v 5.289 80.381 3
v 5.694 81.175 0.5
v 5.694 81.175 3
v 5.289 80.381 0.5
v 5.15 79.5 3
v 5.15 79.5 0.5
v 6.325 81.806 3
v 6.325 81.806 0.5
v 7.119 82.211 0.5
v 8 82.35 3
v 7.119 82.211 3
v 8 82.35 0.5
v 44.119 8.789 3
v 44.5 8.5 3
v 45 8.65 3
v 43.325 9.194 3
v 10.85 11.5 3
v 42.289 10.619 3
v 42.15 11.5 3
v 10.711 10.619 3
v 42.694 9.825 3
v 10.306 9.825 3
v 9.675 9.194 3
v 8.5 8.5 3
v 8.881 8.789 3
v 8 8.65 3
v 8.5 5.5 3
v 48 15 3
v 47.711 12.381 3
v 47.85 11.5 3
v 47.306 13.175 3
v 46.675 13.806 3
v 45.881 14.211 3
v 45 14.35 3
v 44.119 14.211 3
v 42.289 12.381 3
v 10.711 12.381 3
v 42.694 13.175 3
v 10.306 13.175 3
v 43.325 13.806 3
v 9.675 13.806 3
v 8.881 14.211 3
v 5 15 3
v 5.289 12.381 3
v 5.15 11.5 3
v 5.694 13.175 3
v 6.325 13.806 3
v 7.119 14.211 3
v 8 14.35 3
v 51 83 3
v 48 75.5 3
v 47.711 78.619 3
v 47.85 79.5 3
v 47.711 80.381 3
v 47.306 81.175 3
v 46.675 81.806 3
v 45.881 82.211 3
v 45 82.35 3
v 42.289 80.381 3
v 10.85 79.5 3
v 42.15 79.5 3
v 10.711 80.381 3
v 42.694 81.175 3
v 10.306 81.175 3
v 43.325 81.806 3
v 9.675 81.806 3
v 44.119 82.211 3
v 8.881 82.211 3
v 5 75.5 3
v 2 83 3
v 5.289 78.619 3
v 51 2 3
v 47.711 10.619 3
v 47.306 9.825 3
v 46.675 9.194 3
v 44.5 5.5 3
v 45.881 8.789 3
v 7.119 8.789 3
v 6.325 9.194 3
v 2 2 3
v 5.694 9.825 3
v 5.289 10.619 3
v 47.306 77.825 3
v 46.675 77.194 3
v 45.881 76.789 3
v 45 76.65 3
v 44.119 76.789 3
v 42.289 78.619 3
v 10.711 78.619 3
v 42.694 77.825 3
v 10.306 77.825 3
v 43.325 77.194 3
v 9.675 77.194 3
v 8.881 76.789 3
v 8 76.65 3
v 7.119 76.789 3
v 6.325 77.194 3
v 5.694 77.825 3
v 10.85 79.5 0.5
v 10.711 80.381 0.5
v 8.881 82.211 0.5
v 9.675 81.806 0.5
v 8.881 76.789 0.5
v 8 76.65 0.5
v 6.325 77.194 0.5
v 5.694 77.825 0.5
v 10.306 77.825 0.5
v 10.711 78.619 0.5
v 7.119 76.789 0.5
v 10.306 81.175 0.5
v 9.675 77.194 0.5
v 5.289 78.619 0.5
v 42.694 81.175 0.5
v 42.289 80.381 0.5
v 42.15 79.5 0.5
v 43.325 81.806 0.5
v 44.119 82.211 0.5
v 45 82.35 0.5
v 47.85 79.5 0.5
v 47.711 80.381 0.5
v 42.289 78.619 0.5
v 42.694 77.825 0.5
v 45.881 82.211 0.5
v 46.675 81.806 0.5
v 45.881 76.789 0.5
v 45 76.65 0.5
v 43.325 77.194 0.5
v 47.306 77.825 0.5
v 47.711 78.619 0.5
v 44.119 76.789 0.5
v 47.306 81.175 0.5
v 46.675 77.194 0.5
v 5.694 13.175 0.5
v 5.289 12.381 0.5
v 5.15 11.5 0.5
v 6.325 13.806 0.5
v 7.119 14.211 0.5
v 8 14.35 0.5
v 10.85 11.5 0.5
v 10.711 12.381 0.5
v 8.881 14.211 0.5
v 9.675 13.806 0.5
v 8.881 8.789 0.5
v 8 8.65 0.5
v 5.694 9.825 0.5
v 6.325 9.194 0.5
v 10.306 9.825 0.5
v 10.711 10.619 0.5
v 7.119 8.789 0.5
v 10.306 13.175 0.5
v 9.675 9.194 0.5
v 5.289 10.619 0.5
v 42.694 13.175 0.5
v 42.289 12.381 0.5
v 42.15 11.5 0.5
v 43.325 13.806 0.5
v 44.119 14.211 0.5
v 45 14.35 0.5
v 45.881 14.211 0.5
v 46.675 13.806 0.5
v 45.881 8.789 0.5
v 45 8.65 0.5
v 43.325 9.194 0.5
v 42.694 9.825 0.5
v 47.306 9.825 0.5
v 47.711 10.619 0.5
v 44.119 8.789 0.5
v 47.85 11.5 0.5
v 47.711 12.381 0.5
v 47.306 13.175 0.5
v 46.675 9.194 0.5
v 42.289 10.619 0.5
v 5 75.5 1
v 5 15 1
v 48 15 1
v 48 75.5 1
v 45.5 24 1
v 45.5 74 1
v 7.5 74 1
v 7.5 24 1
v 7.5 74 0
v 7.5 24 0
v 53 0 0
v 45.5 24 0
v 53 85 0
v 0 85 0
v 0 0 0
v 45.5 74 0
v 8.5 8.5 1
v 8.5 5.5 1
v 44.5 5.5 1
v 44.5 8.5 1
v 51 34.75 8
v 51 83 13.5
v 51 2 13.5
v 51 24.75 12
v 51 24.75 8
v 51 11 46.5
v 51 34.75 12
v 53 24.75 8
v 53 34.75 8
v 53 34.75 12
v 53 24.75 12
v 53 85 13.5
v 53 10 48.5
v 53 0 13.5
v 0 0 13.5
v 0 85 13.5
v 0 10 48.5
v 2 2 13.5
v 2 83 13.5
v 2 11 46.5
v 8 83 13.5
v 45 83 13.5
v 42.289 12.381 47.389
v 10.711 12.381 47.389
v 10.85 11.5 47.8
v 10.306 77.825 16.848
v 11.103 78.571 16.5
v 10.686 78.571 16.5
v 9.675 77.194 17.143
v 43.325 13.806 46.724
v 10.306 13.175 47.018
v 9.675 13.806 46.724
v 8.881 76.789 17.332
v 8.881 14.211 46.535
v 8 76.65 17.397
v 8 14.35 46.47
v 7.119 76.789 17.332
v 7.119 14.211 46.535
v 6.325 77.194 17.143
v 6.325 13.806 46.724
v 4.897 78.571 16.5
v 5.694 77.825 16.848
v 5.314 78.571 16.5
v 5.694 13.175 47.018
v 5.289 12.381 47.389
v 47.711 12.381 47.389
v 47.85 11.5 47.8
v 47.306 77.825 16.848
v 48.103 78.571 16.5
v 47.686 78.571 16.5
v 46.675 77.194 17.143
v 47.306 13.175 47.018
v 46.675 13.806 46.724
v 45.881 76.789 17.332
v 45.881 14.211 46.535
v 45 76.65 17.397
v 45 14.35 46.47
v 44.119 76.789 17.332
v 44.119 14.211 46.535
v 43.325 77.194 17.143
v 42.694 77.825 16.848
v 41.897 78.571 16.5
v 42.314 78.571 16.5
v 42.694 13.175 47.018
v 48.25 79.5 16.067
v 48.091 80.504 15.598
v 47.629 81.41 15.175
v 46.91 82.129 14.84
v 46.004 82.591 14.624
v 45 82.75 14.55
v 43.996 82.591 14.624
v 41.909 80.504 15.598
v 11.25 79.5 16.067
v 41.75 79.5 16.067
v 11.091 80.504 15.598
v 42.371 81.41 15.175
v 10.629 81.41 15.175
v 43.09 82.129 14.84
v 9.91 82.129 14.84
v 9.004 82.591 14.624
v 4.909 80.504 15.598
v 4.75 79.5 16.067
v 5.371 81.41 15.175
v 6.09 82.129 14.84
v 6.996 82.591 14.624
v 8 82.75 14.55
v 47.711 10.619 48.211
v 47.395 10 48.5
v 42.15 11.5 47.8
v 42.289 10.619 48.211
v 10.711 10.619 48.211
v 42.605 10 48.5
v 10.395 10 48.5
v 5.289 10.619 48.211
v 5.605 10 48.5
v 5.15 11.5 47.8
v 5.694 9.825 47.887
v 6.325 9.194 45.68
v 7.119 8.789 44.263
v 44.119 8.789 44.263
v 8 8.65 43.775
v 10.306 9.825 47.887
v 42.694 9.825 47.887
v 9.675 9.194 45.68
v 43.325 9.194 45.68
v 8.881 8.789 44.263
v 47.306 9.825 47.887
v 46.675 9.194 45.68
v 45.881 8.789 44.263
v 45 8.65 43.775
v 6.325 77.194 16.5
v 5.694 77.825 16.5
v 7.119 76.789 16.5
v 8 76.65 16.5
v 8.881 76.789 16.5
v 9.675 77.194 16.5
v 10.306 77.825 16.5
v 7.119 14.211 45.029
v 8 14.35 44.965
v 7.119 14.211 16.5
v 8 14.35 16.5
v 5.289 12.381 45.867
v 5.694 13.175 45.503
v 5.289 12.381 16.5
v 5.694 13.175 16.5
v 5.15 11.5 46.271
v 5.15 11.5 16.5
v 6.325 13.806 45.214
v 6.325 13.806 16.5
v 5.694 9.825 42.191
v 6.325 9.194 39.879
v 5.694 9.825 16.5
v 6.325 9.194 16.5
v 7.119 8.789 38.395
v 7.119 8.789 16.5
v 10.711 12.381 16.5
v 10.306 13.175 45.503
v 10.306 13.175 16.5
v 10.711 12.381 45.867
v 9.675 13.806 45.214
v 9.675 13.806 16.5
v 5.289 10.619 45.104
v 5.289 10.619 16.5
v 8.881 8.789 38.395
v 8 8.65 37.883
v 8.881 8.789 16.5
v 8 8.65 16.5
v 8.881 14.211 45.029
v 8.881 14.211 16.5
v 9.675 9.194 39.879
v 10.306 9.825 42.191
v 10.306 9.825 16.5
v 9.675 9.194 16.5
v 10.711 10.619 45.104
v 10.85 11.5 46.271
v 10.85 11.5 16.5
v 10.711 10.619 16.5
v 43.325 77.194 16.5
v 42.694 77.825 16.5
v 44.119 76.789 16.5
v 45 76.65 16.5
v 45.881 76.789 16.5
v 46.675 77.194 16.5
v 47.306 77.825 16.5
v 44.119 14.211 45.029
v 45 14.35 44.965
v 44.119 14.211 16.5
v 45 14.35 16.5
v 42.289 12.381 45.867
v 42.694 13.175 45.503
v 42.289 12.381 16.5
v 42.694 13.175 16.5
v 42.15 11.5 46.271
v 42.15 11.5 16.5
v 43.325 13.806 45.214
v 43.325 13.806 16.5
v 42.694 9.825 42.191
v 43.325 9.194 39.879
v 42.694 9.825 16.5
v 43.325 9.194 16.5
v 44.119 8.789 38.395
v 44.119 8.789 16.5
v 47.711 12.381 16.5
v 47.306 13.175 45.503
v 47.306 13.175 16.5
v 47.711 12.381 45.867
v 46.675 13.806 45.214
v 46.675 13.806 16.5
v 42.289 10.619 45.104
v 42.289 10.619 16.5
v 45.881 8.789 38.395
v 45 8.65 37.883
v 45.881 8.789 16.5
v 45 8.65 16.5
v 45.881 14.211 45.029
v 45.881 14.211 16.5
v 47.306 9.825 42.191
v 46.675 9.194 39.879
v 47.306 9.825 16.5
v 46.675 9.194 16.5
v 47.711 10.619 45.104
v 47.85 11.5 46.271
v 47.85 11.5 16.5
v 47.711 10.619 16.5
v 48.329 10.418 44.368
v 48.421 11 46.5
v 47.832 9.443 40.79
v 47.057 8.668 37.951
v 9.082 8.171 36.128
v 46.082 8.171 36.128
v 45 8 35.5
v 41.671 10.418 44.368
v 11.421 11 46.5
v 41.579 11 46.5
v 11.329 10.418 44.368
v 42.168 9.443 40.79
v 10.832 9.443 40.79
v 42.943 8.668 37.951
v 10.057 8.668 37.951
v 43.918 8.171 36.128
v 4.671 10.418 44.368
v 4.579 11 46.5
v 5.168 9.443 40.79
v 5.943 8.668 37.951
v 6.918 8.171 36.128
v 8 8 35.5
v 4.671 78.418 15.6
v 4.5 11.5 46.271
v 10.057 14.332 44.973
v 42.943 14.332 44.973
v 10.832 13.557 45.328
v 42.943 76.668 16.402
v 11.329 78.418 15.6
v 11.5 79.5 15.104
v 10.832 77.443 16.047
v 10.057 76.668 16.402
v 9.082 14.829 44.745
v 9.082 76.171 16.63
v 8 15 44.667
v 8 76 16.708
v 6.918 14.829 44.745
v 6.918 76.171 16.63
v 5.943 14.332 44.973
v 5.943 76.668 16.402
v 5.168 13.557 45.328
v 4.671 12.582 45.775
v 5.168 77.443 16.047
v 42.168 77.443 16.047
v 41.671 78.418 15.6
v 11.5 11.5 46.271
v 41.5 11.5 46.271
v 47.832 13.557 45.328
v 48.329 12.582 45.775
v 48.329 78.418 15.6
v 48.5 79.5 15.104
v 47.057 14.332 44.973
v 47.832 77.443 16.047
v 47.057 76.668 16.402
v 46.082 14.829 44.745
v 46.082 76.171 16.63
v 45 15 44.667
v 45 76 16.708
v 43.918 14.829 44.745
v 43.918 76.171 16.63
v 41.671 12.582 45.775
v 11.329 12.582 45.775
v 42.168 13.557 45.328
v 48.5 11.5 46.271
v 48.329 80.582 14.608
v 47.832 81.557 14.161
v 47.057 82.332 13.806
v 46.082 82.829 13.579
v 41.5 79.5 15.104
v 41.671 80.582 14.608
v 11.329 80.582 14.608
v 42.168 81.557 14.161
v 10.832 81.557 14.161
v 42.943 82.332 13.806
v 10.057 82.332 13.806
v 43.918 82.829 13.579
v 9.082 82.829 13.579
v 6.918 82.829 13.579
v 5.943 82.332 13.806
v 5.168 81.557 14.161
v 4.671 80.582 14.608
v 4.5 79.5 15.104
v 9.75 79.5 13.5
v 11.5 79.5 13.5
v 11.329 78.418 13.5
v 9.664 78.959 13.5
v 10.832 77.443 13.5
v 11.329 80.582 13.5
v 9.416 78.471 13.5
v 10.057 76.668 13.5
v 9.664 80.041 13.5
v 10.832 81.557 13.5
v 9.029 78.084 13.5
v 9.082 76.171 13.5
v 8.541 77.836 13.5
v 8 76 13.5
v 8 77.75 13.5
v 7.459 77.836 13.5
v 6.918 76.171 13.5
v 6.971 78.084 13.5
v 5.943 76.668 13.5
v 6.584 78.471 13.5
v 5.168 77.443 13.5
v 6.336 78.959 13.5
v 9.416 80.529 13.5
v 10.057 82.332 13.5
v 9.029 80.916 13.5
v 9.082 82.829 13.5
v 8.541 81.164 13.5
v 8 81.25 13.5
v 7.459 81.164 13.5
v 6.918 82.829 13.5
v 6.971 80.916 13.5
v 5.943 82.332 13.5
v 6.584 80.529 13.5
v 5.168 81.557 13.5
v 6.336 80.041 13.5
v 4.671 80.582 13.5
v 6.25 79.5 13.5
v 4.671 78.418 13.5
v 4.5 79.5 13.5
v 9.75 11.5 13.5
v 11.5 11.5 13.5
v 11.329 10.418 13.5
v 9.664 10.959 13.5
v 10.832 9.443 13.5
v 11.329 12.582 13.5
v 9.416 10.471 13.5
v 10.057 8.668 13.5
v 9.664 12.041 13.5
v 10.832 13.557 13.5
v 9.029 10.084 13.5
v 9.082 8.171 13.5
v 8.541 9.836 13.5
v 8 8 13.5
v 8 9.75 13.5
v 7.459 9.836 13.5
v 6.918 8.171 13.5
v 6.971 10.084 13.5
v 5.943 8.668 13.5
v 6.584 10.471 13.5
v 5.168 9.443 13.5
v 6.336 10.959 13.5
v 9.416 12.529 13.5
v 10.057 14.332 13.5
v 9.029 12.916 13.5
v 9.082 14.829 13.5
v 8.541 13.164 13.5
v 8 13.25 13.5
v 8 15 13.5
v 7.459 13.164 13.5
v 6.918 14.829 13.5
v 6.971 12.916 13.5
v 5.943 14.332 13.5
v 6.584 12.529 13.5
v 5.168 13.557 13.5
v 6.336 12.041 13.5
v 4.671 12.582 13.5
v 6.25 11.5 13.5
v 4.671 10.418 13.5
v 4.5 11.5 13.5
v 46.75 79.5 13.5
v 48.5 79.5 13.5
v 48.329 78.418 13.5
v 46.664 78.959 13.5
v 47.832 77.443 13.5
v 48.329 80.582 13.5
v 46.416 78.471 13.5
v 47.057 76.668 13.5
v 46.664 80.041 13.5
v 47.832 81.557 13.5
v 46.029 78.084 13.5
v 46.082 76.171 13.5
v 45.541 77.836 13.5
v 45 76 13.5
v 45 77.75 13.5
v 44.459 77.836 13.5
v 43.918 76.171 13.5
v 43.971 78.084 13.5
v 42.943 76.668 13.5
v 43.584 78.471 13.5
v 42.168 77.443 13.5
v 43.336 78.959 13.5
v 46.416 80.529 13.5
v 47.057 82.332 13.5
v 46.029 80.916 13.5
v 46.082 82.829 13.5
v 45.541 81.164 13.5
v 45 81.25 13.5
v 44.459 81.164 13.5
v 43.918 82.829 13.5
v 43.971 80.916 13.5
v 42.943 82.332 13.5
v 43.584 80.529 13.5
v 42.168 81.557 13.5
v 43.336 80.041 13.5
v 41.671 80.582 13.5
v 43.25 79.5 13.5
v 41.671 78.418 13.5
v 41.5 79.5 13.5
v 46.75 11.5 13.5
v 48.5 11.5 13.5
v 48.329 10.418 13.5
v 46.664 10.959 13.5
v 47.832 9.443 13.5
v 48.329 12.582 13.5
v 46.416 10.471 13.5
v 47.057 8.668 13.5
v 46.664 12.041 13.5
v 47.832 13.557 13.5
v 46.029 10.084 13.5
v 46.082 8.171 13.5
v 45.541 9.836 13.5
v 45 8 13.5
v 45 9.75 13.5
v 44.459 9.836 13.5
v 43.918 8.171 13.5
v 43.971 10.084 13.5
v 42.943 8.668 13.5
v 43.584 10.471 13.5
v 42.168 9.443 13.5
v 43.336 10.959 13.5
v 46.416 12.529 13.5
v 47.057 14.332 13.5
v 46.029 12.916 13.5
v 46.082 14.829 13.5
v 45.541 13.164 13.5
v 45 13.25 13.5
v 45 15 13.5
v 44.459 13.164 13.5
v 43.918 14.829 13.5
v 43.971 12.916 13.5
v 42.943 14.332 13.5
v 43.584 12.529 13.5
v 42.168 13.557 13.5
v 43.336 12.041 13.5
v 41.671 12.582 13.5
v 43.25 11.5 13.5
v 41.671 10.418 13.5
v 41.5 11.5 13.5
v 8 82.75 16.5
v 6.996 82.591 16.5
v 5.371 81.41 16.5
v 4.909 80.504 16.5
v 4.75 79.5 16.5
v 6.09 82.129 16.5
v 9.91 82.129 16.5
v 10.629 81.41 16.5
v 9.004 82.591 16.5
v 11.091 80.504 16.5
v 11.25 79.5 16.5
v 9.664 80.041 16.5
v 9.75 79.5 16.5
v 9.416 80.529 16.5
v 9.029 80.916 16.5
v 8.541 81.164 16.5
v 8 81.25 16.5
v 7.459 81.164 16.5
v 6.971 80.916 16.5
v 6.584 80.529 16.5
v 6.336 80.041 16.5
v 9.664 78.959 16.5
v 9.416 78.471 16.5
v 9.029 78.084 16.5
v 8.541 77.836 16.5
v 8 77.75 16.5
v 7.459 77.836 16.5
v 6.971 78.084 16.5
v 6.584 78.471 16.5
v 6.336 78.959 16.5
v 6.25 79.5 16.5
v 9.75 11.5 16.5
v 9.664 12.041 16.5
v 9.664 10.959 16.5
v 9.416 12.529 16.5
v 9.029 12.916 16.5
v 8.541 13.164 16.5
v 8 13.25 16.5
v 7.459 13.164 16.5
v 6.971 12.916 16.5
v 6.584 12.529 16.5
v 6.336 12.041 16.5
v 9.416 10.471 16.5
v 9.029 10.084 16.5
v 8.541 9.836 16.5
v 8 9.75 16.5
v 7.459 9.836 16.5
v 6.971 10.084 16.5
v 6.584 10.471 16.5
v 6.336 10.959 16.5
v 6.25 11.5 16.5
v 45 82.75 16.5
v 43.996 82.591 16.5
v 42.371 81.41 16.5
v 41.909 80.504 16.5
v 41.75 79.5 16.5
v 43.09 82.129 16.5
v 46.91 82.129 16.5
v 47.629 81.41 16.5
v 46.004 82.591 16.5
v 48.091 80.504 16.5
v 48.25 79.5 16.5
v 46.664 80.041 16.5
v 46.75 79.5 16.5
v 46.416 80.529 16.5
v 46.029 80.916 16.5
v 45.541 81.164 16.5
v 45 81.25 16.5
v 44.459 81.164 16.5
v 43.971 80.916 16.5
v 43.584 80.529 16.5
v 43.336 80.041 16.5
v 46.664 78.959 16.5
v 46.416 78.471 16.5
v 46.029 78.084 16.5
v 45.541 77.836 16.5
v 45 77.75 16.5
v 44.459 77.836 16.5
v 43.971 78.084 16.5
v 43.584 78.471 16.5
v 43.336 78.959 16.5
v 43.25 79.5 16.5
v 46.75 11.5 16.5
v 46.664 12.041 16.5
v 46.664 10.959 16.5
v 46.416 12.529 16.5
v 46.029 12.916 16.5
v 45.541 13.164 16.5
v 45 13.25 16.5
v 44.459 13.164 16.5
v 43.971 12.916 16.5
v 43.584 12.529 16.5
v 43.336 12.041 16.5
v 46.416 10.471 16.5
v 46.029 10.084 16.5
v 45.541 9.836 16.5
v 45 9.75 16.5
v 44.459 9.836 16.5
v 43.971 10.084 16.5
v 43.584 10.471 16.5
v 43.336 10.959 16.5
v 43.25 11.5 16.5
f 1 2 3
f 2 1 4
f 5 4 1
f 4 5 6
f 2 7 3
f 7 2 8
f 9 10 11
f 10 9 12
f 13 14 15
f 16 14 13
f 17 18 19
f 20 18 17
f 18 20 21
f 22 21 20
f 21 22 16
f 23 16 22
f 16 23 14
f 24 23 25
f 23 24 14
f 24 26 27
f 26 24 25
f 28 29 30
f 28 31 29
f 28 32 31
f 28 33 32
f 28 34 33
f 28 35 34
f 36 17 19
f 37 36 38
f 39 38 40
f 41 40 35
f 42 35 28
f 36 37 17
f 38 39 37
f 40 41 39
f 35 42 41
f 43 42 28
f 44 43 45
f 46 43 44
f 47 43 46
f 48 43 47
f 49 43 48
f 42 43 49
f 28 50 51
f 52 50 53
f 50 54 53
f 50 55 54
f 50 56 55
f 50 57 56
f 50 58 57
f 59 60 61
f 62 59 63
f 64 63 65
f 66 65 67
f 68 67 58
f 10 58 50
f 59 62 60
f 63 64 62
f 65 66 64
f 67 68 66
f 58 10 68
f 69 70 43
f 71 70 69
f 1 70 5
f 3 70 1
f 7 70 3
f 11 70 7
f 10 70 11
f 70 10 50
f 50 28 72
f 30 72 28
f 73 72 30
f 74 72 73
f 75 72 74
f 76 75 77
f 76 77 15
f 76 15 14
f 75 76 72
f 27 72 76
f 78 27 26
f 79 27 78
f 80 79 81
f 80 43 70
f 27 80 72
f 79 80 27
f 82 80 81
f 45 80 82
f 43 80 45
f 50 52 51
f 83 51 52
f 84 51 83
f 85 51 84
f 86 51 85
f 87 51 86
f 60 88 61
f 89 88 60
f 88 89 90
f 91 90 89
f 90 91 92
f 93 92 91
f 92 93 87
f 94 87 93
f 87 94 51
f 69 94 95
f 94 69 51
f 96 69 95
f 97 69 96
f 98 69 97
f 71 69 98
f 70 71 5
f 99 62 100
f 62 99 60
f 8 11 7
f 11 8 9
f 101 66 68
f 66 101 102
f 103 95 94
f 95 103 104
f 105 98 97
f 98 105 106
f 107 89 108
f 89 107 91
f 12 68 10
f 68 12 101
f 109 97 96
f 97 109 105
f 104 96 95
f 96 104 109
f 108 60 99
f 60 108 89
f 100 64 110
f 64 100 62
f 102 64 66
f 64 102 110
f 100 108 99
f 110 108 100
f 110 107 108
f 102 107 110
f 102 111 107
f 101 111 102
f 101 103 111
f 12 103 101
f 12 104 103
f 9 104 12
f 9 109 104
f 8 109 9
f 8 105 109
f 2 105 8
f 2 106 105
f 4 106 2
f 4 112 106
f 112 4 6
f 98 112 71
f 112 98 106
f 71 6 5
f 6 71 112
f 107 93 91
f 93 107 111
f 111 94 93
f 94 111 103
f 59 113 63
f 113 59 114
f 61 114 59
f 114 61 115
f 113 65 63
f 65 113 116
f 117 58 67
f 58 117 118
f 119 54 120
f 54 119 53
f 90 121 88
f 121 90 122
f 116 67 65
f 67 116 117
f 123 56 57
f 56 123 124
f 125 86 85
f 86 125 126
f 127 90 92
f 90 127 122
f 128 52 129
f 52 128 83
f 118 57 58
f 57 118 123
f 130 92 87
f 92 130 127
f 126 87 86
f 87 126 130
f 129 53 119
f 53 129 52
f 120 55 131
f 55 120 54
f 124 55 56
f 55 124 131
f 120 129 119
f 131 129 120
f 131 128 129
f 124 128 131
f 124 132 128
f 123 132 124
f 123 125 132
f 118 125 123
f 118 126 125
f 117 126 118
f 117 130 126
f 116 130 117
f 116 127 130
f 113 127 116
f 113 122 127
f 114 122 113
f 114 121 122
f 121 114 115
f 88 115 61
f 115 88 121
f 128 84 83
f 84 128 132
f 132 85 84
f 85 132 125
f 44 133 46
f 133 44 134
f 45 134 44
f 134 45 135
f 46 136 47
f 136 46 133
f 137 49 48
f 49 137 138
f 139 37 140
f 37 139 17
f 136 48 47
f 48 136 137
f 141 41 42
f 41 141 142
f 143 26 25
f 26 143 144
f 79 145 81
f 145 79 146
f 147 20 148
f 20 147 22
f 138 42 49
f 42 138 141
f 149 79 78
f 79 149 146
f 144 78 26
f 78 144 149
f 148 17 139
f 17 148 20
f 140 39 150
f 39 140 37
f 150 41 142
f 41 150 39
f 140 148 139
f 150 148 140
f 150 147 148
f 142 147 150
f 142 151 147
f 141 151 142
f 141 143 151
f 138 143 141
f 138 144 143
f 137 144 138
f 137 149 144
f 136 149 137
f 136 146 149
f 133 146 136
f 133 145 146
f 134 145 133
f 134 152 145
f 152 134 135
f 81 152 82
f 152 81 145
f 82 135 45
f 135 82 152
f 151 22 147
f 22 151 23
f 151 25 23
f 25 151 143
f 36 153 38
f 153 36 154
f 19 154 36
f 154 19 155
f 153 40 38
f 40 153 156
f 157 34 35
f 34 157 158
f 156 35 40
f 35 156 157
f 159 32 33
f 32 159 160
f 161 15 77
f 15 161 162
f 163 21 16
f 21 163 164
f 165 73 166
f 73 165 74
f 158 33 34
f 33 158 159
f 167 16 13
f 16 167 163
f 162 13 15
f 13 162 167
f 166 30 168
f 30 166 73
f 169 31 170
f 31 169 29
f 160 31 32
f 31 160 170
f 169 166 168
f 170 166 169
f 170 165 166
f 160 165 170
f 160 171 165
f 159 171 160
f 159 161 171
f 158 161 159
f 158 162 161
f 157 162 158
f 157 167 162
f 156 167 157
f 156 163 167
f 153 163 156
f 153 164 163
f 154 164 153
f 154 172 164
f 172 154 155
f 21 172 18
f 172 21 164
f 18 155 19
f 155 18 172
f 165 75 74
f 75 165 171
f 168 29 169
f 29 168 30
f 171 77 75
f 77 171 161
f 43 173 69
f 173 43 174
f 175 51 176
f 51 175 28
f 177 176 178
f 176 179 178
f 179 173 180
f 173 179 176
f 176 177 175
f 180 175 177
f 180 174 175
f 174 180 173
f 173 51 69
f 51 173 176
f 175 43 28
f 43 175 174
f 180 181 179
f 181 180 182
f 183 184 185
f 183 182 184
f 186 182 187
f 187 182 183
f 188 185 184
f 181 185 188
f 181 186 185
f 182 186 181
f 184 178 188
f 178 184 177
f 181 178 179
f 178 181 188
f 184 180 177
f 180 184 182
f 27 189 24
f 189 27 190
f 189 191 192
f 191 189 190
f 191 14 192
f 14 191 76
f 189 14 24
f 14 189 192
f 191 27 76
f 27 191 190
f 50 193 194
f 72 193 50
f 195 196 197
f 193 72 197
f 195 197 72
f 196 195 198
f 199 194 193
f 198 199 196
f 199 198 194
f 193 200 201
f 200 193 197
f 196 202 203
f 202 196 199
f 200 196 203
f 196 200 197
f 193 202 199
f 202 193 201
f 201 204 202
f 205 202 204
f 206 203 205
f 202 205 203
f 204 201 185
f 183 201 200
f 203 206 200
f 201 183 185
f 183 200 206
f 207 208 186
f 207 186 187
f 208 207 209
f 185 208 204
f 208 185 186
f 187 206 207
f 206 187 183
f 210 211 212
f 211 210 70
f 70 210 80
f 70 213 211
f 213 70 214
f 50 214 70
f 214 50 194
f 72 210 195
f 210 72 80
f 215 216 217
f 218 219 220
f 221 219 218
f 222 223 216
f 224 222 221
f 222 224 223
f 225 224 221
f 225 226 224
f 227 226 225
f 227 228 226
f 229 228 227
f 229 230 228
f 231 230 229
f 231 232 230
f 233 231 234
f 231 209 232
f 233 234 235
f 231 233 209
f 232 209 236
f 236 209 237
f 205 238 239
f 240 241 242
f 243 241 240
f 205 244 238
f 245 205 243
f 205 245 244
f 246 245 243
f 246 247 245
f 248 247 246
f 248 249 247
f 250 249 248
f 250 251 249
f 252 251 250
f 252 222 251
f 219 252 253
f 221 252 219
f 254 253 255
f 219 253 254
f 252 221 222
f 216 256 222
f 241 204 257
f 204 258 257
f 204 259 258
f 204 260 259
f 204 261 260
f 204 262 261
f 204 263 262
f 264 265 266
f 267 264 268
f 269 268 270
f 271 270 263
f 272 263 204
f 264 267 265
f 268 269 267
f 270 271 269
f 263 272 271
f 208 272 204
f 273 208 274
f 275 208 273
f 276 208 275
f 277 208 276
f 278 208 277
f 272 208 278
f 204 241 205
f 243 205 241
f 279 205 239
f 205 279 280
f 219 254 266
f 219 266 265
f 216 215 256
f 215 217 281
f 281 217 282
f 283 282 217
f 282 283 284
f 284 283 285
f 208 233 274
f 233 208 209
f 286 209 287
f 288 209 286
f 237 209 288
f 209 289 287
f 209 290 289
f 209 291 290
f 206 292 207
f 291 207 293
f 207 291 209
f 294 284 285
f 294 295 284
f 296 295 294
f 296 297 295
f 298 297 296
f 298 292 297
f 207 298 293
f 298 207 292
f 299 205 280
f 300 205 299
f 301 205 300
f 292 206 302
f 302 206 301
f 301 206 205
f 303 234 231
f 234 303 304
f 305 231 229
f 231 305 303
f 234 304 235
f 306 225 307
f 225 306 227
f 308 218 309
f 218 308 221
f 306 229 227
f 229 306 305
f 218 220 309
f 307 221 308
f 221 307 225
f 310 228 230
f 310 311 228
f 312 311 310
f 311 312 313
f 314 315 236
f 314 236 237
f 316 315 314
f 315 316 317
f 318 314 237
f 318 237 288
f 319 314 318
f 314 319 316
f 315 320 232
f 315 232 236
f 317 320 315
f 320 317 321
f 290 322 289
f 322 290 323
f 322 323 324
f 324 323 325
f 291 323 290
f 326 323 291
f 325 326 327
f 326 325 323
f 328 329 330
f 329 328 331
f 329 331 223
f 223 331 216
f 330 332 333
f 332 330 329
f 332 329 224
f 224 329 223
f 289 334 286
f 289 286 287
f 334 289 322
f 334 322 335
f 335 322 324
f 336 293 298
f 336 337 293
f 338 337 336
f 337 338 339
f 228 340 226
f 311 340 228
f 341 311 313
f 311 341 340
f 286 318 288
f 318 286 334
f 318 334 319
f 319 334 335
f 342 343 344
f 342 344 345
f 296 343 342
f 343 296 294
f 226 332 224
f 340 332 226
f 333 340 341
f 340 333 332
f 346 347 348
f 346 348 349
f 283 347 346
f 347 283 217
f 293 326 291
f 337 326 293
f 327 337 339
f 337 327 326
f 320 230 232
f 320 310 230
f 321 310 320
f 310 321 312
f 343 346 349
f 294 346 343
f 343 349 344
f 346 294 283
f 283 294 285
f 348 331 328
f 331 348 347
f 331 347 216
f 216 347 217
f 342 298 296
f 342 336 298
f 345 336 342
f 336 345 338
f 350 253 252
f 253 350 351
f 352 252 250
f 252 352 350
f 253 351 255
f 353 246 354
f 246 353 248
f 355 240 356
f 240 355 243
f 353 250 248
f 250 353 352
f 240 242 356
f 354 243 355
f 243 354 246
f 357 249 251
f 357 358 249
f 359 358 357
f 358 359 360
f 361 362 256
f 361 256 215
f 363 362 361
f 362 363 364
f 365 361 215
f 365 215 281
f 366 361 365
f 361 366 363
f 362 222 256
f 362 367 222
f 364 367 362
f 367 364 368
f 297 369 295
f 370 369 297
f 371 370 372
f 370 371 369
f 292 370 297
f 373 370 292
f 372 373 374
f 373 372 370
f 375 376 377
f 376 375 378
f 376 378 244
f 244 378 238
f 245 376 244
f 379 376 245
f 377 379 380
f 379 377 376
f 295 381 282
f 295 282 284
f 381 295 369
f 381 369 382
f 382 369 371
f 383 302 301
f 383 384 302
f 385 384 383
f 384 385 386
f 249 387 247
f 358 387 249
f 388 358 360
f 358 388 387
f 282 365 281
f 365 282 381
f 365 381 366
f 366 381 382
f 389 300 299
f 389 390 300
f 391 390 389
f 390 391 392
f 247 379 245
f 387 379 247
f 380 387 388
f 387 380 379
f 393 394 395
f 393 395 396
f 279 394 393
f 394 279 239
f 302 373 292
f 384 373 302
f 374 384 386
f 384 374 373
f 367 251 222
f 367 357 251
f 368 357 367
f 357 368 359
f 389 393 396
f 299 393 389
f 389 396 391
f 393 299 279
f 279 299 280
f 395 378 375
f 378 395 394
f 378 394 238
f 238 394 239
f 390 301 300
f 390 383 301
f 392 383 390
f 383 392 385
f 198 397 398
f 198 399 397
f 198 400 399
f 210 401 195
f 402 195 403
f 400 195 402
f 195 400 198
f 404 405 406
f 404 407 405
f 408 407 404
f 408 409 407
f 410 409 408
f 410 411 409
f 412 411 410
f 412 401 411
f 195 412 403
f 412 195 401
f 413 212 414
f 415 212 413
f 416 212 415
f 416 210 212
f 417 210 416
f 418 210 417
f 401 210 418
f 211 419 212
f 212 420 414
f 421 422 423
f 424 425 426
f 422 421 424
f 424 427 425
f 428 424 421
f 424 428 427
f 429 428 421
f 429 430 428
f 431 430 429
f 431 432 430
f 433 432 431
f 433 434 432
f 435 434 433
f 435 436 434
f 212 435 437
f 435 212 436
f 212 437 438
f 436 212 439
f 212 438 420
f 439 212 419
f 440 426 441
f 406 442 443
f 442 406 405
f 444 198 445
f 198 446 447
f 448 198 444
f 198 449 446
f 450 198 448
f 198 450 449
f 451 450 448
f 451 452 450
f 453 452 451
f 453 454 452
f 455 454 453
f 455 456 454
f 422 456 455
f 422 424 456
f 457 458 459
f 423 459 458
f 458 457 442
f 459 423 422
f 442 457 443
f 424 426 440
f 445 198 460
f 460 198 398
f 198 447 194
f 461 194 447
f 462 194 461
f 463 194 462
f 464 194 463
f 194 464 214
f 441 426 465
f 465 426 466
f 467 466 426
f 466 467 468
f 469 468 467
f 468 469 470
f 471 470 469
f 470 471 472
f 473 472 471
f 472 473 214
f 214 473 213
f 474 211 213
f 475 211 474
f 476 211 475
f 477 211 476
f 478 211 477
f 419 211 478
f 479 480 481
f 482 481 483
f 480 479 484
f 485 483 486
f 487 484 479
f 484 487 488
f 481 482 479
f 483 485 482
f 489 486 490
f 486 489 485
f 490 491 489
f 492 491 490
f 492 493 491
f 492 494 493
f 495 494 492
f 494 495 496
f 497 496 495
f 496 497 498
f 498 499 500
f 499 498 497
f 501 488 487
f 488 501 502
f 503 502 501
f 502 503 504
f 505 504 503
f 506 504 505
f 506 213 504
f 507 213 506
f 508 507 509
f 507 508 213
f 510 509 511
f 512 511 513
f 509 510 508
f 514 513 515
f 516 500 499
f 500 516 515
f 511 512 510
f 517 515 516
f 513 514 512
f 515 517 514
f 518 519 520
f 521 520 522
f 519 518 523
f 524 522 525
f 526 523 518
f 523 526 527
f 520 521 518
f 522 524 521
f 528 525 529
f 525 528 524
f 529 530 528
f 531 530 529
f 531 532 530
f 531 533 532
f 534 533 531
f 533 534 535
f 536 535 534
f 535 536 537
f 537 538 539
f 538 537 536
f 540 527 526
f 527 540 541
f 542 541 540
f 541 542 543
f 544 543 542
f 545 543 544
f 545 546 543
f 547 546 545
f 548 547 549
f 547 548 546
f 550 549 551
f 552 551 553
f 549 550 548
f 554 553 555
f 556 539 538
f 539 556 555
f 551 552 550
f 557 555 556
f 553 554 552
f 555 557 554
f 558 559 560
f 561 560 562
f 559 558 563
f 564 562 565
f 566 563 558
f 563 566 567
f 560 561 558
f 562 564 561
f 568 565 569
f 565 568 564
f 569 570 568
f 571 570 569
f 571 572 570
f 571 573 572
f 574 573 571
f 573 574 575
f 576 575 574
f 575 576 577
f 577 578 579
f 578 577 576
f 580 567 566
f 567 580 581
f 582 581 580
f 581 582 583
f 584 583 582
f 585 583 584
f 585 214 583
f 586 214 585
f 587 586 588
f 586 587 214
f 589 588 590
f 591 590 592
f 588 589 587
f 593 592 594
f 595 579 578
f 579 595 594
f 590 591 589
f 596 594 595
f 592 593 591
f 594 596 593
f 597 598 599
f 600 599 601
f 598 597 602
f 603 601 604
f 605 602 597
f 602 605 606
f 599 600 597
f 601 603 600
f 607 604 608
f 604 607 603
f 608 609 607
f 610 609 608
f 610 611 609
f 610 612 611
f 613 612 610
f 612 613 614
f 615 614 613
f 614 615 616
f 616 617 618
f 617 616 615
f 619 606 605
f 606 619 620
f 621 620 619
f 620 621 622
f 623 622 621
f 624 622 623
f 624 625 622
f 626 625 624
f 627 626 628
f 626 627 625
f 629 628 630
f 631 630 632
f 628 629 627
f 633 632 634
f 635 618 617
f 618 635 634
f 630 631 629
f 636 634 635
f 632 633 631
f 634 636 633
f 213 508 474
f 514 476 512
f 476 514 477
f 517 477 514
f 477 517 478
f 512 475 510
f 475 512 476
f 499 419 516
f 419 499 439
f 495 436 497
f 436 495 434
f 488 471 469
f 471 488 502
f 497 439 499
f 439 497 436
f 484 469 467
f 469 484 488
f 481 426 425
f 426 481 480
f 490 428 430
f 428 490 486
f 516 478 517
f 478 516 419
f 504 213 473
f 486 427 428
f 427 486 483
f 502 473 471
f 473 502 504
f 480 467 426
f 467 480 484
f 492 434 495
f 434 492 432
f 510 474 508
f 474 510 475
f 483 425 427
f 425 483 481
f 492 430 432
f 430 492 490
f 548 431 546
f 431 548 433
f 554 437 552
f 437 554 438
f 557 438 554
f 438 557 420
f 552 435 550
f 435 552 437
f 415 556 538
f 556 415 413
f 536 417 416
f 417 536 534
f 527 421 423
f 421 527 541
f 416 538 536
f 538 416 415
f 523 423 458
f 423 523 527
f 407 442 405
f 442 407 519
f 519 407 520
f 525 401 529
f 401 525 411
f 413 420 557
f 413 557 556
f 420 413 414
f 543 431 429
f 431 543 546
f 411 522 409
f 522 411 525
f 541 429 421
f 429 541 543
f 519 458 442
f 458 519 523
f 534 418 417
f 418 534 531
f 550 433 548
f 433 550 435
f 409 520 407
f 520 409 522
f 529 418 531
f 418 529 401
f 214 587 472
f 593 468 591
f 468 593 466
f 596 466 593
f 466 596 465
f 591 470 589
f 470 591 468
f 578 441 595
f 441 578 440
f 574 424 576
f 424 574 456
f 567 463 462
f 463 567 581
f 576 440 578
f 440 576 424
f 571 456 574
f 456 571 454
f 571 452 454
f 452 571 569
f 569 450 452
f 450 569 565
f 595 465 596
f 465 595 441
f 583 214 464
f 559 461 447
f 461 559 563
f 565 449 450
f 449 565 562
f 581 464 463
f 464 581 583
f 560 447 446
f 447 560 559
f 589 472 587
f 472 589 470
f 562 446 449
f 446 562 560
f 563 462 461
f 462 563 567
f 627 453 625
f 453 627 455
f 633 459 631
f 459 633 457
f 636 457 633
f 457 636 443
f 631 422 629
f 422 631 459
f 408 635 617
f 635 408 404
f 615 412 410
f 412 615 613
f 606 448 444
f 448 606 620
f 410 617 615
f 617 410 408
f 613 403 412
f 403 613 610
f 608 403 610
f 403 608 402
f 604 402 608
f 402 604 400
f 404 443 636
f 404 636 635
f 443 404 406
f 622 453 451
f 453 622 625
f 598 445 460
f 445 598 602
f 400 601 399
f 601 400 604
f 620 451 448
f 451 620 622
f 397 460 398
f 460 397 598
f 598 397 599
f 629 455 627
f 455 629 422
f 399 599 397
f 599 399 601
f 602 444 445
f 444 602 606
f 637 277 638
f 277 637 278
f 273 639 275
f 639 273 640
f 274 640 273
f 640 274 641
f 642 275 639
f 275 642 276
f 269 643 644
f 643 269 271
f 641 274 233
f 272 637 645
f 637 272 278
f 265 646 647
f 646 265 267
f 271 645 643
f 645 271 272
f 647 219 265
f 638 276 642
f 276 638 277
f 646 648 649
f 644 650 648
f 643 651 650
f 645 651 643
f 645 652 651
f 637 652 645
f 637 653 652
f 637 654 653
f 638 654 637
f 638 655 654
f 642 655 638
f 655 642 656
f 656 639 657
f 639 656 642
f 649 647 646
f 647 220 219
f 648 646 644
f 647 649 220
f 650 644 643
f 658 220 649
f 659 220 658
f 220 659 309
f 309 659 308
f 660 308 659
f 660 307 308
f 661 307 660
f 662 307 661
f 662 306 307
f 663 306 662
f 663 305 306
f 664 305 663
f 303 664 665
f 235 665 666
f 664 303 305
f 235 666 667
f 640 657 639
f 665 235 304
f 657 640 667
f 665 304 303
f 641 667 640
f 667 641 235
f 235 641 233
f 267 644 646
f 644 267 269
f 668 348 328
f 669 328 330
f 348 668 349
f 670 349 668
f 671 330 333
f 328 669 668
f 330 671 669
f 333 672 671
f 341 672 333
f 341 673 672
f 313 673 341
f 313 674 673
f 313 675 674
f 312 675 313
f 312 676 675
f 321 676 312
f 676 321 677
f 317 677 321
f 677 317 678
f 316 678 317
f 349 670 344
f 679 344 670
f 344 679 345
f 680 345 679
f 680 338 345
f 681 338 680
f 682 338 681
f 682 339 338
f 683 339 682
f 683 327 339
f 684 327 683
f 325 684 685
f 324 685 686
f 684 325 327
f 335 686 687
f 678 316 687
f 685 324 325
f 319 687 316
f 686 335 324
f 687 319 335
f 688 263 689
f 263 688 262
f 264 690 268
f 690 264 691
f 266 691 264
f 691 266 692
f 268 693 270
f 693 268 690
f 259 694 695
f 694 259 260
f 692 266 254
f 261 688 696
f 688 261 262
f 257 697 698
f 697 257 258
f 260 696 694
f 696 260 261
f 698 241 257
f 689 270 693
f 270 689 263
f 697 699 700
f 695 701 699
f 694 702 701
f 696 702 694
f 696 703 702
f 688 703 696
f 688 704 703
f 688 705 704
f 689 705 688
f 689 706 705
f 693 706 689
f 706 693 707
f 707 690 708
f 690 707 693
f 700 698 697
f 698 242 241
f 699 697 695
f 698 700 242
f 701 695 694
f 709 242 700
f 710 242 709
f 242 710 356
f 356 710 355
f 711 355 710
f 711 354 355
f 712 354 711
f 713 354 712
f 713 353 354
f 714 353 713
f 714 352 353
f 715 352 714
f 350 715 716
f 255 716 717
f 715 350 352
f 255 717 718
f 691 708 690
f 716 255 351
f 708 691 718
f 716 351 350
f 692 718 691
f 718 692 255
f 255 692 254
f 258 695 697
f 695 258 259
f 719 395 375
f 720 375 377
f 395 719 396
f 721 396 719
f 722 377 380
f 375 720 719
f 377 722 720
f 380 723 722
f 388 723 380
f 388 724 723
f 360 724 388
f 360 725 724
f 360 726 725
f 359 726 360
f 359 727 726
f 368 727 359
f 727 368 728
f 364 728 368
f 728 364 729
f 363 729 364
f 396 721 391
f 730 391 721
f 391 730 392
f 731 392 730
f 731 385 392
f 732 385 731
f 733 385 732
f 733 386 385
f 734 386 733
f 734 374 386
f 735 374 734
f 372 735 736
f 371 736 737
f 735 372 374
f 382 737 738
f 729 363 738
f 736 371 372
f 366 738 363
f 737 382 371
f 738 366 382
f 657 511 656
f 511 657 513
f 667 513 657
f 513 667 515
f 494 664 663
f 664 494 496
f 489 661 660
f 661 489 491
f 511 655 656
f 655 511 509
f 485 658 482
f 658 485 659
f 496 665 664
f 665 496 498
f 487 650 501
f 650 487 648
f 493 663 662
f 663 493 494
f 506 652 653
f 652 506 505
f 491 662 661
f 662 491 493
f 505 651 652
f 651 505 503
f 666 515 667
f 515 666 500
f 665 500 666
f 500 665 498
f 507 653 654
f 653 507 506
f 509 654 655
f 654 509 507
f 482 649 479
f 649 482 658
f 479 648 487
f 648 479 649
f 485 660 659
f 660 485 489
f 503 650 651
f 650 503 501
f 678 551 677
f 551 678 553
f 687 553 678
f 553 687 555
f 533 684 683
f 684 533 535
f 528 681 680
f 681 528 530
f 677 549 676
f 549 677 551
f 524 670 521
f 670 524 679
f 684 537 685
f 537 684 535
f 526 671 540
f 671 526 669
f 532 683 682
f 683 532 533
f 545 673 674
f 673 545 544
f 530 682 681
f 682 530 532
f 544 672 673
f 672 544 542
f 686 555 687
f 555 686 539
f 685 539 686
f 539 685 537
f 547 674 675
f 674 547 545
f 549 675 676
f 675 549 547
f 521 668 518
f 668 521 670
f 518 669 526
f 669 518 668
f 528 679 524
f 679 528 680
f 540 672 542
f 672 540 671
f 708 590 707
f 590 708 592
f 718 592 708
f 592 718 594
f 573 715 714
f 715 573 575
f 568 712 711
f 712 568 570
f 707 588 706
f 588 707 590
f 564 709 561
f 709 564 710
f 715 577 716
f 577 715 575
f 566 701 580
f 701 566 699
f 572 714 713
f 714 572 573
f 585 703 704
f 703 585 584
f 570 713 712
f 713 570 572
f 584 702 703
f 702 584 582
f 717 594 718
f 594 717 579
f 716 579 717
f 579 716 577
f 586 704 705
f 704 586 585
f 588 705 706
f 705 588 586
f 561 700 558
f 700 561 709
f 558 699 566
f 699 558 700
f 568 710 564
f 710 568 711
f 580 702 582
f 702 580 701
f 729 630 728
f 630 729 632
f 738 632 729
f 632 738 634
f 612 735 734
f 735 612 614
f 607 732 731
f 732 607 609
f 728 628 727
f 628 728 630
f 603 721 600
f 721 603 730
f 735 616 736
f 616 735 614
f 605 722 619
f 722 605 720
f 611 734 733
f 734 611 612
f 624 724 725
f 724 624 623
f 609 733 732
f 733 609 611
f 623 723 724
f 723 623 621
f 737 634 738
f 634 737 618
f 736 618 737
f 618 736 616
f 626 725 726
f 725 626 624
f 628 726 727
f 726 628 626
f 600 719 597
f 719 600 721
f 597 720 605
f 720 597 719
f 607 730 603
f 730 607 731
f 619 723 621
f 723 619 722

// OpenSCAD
// file: configuration.scad
draw_complete = 1;
draw_front = 0;
draw_top = 0;
draw_spacers = 0;

width = 53;
height = 85;
depth = 13.5;
thickness = 2;
clearance = 0.2;

lcd_pcb_width = 43;
lcd_pcb_height = 77;
lcd_pcb_depth = 1;
lcd_pcb_offset = 5;

lcd_width = 43;
lcd_height = 60.5;
lcd_depth = 2;
lcd_offset = 10; // offset from bottom of lcd pcb to lcd edge

lcd_connector_width = 36;
lcd_connector_depth = 3;
lcd_connector_height = 30;
lcd_connector_offset = 0.5; // offset from bottom of pcb to connector edge

lcd_display_width = 38;
lcd_display_height = 50;
lcd_display_offset = 9; // offset from the bottom of the lcd to the display part

lcd_hole_spacing_x = 37;

screw_well_outer_dia = 7;
screw_well_inner_dia = 5.5 + clearance;

node_length = 48;
node_width = 30.5;
node_connector_spacing = 28;
node_connector_length = 38;
// main file
include <configuration.scad>

module ilI9341() {
    difference() {
        union() {
            // pcb
            cube([lcd_pcb_width, lcd_pcb_height, lcd_pcb_depth]);
            // lcd
            translate([0, lcd_offset, 1]) cube([lcd_width, lcd_height, 2]);
            // display clearance
            translate([(lcd_width - lcd_display_width)/2, lcd_offset + lcd_display_offset, 3])
                cube([lcd_display_width, lcd_display_height, 1]);
            // connector clearance
            translate([(lcd_pcb_width - lcd_connector_width)/2, lcd_connector_offset, -lcd_connector_height + 3]) cube([lcd_connector_width, lcd_connector_depth, lcd_connector_height]);
            // screw and nuts clearance
            for(i=[-1,1]) translate([lcd_pcb_width/2 - i * lcd_hole_spacing_x/2, lcd_pcb_height -2.5, 0]) {
                translate([0, 0, 1]) cylinder(d=5.7, h=2.5, $fn=20);
                translate([0, 0, -10]) cylinder(d=3, h=10, $fn=20);
            }
            for(i=[-1,1]) translate([lcd_pcb_width/2 - i * lcd_hole_spacing_x/2, 6.5, 0]) {
                translate([0, 0, 1]) cylinder(d=5.7, h=2.5, $fn=20);
                translate([0, 0, -10]) cylinder(d=3, h=10, $fn=20);
            }
        }
        // mounting holes
        % for(i=[-1,1]) translate([lcd_pcb_width/2 - i * lcd_hole_spacing_x/2, lcd_pcb_height -2.5, 0]) {
            cylinder(d=3.5, h=1, $fn=20);
        }
        % for(i=[-1,1]) translate([lcd_pcb_width/2 - i * lcd_hole_spacing_x/2, 6.5, 0]) cylinder(d=3.5, h=1, $fn=20);
    }

}


module node_mcu() {
    // pcb
    cube([node_length, node_width, 1.5]);
    // pins
    translate([3, 0, -3]) cube([node_connector_length, 2.5, 20]);
    translate([3, node_width - 2.5, -3]) cube([node_connector_length, 2.5, 30]);
    // components
    translate([0, 5.5, -3]) cube([20, 18.5, 3]);
    translate([20, 5.5, -5]) cube([node_length - 20, 18.5, 5]);
    // usb port hole
    translate([-10, node_width/2 - 5, -3]) cube([10,10, 4]);
}

module node_bottom_support() {
    cube([lcd_pcb_width, 5, 4]);
    translate([23, 0, 0]) cube([20, 30, 2]);
}

module lcd_top_support() {
    difference() {
        cube([lcd_pcb_width, 6, 9]);
            for(i=[-1,1])
                translate([lcd_pcb_width/2 - i * lcd_hole_spacing_x/2, 3, 0])
                    cylinder(d=3.5, h=9, $fn=20);
        }
}

module node_top_support() {
    cube([lcd_pcb_width + 2, 40, 2]);
    translate([0, 0, -3.5]) cube([lcd_pcb_width, 4, 3.5]);
}

module front_case() {
    difference() {
        // enclosure
        cube([width, height, depth]);
        // carving up the inside
        translate([thickness, thickness, thickness + 1])
            cube([width - thickness * 2, height - thickness * 2, depth]);
        # translate([lcd_pcb_width + (width - lcd_pcb_width)/2, lcd_pcb_offset, 4,]) rotate([0, 180, 0]) ilI9341();
        # translate([51, 45, 11]) rotate([0, 0, 180]) node_mcu();
    }
}



function screw_pos(i = 1, pos = "top") =
    pos == "top" ?
        [lcd_pcb_width/2 - i * lcd_hole_spacing_x/2, lcd_pcb_height -2.5, 0] :
        [lcd_pcb_width/2 - i * lcd_hole_spacing_x/2, 6.5, 0];

module outer_screw_well() cylinder(d=screw_well_outer_dia, h=40, $fn=20);

module inner_screw_well() cylinder(d=screw_well_inner_dia, h=40, $fn=20);

module top_case() {
    difference() {
        union() {
            linear_extrude(height = width)
                polygon([[0, 0], [0, height], [35, 10]]);
            difference() {
                translate([40, 5, 5]) rotate([0, -90, 0]) {
                    for(i=[-1,1]) translate(screw_pos(i, "top")) outer_screw_well();
                    for(i=[-1,1]) translate(screw_pos(i, "bottom")) outer_screw_well();
                }
                linear_extrude(height = width) polygon([ [0,0], [35, 10], [0, height], [50, height], [50, 0]]);
            }
        }
        translate([0, 0, thickness]) linear_extrude(height = width - thickness * 2)
            polygon([[0, 2], [0, height - 2], [33, 11]]);
        translate([40, 5, 5]) rotate([0, -90, 0]) {
            for(i=[-1,1]) {
                translate(screw_pos(i, "top")) inner_screw_well();
                translate(screw_pos(i, "bottom")) inner_screw_well();
            }
        }
    }
    difference() {
        translate([40, 5, 5]) rotate([0, -90, 0]) {
            difference() {
                for(i=[-1,1]) {
                    translate(screw_pos(i, "top")) outer_screw_well();
                    translate(screw_pos(i, "bottom")) outer_screw_well();
                }
                for(i=[-1,1]) {
                    translate(screw_pos(i, "top")) inner_screw_well();
                    translate(screw_pos(i, "bottom")) inner_screw_well();
                }
            }
        }
        linear_extrude(height = width) polygon([ [0,0], [35, 10], [0, height], [50, height], [50, 0]]);
    }
    translate([3, 5, 5]) rotate([0, -90, 0]) {
        difference() {
            for(i=[-1,1]) {
                translate(screw_pos(i, "top"))
                    cylinder(d=6.5, h=3, $fn=20);
                translate(screw_pos(i, "bottom"))
                    cylinder(d=6.5, h=3, $fn=20);
            }
            for(i=[-1,1]) {
                translate(screw_pos(i, "top"))
                    cylinder(d=3.5, h=3, $fn=20);
                translate(screw_pos(i, "bottom"))
                    cylinder(d=3.5, h=3, $fn=20);
            }
        }
    }
}

if (draw_complete == 1) {
    front_case();
    translate([width, 0, 13.5]) rotate([0, -90, 0]) top_case();
}

if (draw_complete == 0 && draw_front == 1) {
    front_case();
}


if (draw_complete == 0 && draw_top == 1) {
    translate([width, 0, 0]) rotate([0, -90, 0]) top_case();
}

if (draw_complete == 0 && draw_spacers == 1) {
    lcd_top_support();

    translate([-5, 0, -6]) difference() {
        translate([5, 9, 6]) node_bottom_support();
        translate([lcd_pcb_width + (width - lcd_pcb_width)/2, lcd_pcb_offset, 4,]) rotate([0, 180, 0]) ilI9341();
        translate([51, 45, 11]) rotate([0, 0, 180]) node_mcu();
    }

    translate([-5, 0, 13.5]) rotate([180, 0, 0]) difference() {
        translate([5, 9, 11.5]) node_top_support();
        translate([lcd_pcb_width + (width - lcd_pcb_width)/2, lcd_pcb_offset, 4,]) rotate([0, 180, 0]) ilI9341();
        translate([51, 45, 11]) rotate([0, 0, 180]) node_mcu();
    }
}
